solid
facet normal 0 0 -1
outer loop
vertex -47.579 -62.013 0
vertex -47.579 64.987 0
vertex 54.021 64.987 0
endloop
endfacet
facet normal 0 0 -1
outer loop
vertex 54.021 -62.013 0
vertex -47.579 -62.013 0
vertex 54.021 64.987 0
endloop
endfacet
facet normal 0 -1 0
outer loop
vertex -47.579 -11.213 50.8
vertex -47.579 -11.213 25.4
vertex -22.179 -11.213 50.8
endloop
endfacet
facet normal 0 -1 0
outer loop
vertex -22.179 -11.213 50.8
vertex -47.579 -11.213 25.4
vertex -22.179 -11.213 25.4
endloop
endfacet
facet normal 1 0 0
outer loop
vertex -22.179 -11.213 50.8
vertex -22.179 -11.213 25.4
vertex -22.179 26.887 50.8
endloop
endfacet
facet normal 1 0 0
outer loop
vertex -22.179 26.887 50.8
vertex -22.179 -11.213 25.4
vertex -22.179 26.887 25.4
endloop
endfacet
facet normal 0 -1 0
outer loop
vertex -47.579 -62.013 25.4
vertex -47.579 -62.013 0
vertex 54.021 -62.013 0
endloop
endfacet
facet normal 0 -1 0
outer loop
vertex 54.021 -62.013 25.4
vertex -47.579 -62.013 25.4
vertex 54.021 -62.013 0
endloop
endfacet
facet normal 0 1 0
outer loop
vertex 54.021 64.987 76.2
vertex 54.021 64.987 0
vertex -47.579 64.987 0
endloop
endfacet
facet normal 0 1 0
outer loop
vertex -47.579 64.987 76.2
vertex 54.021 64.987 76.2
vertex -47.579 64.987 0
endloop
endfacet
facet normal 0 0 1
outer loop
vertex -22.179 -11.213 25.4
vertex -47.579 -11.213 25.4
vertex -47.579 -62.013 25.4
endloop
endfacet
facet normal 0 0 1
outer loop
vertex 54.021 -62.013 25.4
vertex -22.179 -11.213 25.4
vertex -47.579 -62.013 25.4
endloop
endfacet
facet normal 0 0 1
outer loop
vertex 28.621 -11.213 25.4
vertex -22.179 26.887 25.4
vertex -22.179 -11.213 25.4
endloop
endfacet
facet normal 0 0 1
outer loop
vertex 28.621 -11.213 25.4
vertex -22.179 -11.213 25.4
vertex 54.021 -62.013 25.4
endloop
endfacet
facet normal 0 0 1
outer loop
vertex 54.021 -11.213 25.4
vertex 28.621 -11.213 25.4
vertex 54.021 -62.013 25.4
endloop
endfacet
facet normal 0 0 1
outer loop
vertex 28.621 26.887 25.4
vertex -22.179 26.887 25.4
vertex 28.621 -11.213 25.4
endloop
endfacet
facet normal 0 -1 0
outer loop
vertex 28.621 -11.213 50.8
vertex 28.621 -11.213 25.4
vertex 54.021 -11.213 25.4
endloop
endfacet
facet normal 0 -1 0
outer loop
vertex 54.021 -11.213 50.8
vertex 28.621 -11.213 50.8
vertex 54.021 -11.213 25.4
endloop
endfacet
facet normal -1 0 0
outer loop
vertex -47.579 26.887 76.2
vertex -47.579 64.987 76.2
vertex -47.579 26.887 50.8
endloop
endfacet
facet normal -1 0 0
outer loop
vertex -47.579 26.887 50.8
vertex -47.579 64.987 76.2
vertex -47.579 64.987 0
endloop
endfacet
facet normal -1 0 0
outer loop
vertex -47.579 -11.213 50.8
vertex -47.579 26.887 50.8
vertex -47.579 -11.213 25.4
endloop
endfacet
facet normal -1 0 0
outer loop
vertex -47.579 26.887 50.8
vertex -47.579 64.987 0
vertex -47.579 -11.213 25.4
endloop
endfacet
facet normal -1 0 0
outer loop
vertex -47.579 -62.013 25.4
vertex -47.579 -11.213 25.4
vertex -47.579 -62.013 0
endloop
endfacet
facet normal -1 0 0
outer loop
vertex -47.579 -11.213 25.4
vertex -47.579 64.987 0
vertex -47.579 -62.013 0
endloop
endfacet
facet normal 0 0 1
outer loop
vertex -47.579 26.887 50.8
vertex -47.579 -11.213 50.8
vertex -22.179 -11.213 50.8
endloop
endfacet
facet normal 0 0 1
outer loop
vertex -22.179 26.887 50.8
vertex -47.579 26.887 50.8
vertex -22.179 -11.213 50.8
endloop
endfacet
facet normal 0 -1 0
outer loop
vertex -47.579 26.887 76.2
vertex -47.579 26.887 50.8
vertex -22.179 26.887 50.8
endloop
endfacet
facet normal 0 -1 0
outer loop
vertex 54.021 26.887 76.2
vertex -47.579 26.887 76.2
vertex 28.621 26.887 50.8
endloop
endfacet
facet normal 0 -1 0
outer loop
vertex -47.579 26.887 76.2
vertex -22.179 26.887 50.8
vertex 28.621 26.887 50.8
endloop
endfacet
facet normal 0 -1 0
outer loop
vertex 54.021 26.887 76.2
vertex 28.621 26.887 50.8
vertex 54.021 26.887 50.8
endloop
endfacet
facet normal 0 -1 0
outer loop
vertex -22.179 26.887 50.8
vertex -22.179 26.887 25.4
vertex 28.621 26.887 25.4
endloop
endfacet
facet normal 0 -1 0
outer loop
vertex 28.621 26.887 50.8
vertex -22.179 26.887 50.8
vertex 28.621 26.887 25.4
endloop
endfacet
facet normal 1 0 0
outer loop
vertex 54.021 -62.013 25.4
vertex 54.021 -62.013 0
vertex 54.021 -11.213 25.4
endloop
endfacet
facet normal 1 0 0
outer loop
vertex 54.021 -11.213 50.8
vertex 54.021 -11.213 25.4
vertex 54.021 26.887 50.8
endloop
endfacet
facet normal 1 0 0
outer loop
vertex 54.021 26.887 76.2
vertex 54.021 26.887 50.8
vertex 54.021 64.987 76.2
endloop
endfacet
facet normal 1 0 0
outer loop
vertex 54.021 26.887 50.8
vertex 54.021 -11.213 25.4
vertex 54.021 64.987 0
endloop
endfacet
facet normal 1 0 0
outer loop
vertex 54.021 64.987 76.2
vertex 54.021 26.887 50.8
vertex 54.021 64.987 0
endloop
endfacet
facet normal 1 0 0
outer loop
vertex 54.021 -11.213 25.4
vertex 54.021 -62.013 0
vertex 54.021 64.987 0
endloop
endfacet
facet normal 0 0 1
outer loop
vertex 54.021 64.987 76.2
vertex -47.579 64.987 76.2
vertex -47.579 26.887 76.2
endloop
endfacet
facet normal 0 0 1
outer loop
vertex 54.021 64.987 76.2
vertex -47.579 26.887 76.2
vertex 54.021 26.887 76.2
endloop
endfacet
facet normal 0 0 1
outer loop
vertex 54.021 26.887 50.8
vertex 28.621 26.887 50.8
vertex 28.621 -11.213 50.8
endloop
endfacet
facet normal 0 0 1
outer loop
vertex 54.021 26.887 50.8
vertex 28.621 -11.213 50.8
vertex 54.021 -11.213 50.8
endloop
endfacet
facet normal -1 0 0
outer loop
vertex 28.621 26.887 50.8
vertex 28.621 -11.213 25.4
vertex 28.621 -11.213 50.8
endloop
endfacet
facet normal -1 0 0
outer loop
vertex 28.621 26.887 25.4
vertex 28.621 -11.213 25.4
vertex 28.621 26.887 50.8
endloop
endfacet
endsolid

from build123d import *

# Parameters (mm, degrees)
F0_W     = 101.6
F0_H     = 127
F1_DEPTH = 25.4
F2_W     = 25.4
F2_H     = 38.1
F3_DEPTH = 25.4
F5_DEPTH = 25.4


with BuildPart() as f1:
    # F0 (on Top) → F1 (new body)
    with BuildSketch(Plane.XY):
        with Locations((3.221489, 1.487175)):
            Rectangle(F0_W, F0_H)
    extrude(amount=F1_DEPTH)

    # F2 (on face) → F3 (join)
    with BuildSketch(Plane.XY.offset(25.4)):
        Polygon((54.021489, 64.987175), (-47.578511, 64.987175), (-47.578511, 26.887175), (-22.178511, 26.887175), (28.621489, 26.887175), (54.021489, 26.887175), align=None)
        with Locations((-34.878511, 7.837175)):
            Rectangle(F2_W, F2_H)
        with Locations((41.321489, 7.837175)):
            Rectangle(F2_W, F2_H)
    extrude(amount=F3_DEPTH)

    # F4 (on face) → F5 (join)
    with BuildSketch(Plane.XY.offset(50.8)):
        Polygon((54.021489, 64.987175), (-47.578511, 64.987175), (-47.578511, 26.887175), (-22.178511, 26.887175), (28.621489, 26.887175), (54.021489, 26.887175), align=None)
    extrude(amount=F5_DEPTH)


solid = f1.part
